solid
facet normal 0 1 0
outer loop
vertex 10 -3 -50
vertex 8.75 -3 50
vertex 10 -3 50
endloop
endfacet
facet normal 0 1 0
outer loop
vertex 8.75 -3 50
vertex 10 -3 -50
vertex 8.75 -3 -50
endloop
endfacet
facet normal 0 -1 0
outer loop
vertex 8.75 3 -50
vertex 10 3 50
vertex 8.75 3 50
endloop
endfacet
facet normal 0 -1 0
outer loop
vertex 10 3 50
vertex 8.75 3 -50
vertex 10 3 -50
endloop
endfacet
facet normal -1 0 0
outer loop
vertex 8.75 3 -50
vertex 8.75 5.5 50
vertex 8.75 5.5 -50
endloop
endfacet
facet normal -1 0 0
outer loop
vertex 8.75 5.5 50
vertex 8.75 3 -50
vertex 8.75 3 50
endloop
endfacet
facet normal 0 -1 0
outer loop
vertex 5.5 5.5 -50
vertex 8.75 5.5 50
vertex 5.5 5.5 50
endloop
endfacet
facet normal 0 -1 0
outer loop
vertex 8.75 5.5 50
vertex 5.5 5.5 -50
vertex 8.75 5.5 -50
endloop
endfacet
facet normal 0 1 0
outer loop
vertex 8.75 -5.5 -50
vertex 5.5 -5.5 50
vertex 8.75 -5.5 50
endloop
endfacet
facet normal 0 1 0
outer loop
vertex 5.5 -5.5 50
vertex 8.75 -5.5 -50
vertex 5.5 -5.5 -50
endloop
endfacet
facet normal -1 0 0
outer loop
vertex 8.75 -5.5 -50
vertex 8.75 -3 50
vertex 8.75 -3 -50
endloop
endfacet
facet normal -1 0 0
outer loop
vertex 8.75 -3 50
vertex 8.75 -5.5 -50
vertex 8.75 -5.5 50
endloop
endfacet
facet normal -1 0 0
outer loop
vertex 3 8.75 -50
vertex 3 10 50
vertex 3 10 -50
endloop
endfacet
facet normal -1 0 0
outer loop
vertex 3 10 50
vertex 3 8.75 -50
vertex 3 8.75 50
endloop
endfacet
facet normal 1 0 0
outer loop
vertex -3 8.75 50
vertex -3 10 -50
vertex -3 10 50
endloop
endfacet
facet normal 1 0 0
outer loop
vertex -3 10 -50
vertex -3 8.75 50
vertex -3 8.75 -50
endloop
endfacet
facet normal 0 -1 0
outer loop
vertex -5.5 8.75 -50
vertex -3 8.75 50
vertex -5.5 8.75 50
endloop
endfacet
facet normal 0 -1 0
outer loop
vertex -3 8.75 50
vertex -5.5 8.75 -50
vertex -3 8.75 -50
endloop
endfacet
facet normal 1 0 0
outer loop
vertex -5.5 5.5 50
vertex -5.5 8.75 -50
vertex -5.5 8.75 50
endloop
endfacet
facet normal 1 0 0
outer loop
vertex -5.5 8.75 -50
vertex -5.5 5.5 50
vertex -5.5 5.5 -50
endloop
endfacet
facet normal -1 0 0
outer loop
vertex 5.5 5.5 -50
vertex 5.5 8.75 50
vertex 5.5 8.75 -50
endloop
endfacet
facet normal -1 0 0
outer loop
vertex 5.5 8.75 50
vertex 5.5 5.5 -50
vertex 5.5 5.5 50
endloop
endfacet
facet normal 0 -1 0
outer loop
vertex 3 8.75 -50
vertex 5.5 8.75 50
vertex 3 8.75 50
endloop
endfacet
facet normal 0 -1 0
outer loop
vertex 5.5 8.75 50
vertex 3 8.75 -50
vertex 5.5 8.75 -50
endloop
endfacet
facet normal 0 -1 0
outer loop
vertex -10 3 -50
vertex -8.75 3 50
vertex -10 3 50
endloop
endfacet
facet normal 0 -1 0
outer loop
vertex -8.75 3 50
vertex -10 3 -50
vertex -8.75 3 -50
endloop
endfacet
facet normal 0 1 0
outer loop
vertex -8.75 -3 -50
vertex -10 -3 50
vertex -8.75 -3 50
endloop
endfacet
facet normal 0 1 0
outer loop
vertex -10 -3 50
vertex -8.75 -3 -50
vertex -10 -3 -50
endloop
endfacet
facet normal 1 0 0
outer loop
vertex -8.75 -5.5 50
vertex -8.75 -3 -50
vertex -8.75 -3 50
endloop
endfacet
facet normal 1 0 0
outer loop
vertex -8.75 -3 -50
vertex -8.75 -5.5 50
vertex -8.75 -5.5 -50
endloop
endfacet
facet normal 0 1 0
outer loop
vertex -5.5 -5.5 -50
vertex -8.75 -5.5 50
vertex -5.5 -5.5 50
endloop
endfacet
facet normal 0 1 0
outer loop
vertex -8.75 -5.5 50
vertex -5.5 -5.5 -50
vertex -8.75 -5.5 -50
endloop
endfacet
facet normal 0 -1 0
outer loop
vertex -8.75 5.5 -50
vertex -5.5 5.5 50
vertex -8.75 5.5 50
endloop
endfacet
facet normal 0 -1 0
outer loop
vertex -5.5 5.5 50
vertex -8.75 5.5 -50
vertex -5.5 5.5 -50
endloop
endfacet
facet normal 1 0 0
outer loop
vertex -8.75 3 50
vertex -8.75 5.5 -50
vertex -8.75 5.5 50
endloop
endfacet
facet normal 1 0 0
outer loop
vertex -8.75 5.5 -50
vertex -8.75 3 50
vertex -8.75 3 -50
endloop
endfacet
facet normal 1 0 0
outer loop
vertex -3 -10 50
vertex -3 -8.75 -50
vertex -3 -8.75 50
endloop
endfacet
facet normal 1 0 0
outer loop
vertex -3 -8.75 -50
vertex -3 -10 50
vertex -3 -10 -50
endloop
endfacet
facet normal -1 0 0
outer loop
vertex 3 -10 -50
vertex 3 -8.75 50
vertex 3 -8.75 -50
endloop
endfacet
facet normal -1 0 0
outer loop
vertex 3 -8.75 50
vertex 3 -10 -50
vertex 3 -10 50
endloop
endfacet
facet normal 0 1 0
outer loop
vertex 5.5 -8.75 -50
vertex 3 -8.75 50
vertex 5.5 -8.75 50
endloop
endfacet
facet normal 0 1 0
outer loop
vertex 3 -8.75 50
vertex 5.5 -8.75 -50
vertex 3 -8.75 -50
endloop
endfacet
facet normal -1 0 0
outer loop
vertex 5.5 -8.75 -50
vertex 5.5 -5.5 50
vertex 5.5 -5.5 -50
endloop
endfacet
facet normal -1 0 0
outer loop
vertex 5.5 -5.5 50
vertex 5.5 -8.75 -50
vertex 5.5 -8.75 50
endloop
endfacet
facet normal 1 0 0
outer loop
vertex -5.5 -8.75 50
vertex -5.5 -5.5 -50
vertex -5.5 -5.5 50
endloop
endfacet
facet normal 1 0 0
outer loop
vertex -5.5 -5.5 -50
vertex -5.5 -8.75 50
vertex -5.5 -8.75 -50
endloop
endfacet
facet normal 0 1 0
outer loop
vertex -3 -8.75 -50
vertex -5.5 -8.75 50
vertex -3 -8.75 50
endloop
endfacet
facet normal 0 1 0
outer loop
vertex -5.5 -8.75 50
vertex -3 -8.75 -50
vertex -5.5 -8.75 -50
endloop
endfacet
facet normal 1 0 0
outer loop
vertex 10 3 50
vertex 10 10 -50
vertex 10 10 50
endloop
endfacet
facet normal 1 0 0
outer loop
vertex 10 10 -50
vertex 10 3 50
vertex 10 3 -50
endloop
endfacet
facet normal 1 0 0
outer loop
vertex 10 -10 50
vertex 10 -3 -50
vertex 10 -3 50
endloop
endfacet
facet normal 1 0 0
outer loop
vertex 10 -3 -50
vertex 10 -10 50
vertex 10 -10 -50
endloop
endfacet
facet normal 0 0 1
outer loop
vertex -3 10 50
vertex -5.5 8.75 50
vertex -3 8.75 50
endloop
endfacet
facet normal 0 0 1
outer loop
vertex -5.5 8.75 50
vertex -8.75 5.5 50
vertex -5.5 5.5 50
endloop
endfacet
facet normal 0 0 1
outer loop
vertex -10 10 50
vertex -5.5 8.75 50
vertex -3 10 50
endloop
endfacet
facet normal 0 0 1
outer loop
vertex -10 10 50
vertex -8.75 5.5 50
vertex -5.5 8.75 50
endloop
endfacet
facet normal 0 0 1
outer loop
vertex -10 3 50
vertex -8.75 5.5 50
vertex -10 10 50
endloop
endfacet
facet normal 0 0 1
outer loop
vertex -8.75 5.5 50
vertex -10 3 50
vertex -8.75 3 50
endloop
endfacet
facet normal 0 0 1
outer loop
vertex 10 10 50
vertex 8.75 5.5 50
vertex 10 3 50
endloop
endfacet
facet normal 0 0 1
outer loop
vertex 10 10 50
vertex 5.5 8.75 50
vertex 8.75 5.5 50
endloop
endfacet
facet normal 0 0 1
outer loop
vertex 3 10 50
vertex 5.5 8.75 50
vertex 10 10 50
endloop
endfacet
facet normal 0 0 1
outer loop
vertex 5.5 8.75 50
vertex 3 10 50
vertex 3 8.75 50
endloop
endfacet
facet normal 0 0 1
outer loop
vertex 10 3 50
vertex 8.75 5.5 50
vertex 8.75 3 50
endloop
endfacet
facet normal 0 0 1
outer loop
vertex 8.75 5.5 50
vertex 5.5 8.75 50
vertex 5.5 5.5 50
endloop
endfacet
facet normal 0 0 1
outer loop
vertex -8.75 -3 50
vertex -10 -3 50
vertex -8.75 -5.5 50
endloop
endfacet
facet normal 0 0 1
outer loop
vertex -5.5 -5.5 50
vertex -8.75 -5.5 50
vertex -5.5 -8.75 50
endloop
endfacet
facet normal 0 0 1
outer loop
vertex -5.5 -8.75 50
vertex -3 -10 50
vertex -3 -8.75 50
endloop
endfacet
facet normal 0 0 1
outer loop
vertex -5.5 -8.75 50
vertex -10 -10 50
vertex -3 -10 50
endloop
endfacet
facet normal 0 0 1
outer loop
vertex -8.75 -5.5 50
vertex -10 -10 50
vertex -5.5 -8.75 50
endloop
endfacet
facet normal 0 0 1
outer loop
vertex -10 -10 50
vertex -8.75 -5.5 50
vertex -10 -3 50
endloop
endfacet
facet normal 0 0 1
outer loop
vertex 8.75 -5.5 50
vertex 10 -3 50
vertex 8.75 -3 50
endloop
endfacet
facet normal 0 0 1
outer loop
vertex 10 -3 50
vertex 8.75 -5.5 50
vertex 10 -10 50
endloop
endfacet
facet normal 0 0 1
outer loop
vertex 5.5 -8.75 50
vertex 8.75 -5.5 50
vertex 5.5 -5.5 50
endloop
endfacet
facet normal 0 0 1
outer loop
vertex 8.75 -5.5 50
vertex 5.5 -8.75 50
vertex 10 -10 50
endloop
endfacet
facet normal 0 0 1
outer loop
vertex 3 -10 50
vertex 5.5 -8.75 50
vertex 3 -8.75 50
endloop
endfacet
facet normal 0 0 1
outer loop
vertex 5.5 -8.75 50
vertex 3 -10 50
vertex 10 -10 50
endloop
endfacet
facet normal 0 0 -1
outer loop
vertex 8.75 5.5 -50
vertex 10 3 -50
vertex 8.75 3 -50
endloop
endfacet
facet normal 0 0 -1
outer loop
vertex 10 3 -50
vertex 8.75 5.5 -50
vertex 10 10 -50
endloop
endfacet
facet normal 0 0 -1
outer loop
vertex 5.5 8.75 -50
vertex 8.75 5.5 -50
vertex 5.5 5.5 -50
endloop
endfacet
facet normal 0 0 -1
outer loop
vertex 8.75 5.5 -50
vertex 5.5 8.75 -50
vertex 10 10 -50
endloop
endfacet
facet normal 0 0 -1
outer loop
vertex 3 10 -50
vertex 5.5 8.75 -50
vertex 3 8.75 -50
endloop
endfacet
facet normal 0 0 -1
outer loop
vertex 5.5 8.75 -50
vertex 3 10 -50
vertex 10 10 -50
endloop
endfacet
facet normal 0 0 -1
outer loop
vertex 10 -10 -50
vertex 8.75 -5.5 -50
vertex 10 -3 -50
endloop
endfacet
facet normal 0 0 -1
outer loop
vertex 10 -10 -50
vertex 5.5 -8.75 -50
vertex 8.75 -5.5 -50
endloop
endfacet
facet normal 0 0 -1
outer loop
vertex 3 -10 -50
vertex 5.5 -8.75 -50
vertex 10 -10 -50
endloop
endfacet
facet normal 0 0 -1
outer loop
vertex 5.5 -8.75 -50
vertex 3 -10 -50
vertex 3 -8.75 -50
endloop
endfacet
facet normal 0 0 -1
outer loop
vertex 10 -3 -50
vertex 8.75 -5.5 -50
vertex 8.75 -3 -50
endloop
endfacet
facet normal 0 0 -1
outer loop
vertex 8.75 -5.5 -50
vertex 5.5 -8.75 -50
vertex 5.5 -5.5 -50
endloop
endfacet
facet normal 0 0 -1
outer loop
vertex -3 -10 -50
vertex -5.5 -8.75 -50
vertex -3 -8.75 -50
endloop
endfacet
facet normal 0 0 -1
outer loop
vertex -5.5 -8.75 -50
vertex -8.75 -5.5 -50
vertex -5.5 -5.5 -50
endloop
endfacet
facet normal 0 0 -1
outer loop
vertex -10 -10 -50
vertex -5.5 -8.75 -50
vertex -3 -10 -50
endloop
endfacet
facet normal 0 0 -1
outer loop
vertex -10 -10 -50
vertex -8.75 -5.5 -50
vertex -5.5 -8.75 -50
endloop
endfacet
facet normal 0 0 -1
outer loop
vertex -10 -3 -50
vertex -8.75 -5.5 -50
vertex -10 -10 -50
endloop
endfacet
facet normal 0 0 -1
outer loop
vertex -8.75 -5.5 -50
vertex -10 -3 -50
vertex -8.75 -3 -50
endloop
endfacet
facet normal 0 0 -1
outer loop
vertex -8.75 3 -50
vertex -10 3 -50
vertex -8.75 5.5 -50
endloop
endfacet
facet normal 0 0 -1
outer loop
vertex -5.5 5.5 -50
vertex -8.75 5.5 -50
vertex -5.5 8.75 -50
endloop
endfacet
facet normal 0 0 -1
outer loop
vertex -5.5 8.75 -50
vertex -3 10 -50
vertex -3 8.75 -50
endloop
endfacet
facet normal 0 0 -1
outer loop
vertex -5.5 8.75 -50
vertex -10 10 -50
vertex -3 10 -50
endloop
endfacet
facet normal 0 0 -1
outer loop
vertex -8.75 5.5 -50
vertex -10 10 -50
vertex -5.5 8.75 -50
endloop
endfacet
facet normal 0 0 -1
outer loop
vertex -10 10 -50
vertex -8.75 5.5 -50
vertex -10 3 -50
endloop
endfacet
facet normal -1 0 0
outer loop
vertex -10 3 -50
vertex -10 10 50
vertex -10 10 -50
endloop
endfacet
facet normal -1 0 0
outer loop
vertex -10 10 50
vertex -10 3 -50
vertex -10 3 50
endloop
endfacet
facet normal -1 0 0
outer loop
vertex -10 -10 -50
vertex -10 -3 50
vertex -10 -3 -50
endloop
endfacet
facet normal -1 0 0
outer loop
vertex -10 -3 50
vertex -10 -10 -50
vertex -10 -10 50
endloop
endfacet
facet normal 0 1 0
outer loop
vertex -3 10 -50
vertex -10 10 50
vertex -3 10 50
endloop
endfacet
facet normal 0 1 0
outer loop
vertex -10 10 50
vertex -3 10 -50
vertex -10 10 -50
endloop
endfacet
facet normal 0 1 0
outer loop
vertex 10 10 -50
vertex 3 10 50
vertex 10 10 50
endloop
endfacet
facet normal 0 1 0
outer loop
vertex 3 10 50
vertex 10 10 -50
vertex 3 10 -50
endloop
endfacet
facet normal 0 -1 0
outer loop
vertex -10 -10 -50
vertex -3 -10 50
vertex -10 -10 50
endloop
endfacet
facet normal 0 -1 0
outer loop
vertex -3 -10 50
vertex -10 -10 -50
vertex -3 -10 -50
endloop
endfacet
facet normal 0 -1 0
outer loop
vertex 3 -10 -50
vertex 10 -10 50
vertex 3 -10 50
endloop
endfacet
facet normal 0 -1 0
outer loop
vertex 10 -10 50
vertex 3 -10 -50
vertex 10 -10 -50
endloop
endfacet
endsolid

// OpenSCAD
// 20x20 T-slot aluminium extrusion (2020-style), 100mm long
// STRUCTURAL FIX: prevent the slot cutters from removing the central webs,
// which previously split the body into disconnected corner blocks / two rails.
// Approach: keep a guaranteed "web" thickness at the center in BOTH axes by
// limiting the slot cavity/mouth width to (outer - 2*min_wall - 2*web_keep).

cross_section_width_mm  = 20.0;
cross_section_height_mm = 20.0;
length_mm               = 100.0;

// Robust overlap for manifold boolean ops
overlap_mm = 1.5;

// Outer size
outer_w = cross_section_width_mm;
outer_h = cross_section_height_mm;

// Typical-ish 2020 features (approximate)
center_bore_diameter_mm = 5.0;

// T-slot geometry (per side, cut from the outer face inward)
slot_opening_mm       = 6.0;
slot_opening_depth_mm = 2.0;
slot_cavity_width_mm  = 11.0;
slot_cavity_depth_mm  = 6.5;

// Minimum wall to outer boundary
min_wall_mm = 1.6;

// CRITICAL CONNECTIVITY PARAMETER:
// Keep a solid web through the center so the profile cannot split into two rails / four corners.
web_keep_mm = 2.0;  // >= 1..2mm as requested

// Helpers
function clamp(v, lo, hi) = max(lo, min(hi, v));

// Clamp depths to safe ranges
slot_opening_depth_mm_c = clamp(slot_opening_depth_mm, 0.8, outer_w/2.0 - min_wall_mm);
slot_cavity_depth_mm_c  = clamp(slot_cavity_depth_mm, slot_opening_depth_mm_c + 1.0, outer_w/2.0 - min_wall_mm);

// Clamp widths to safe ranges (will be further limited for connectivity)
slot_opening_mm_c      = clamp(slot_opening_mm, 2.0, outer_h - 2.0*min_wall_mm);
slot_cavity_width_mm_c = clamp(slot_cavity_width_mm, slot_opening_mm_c, outer_h - 2.0*min_wall_mm);

// 2D cutter for one side, pointing toward +X, centered at origin
module tslot_cut_2d() {
    // Ensure the cutter NEVER removes the central web:
    // Remaining material at center in Y must be at least web_keep_mm.
    // So cutter width must be <= (outer_h - 2*min_wall_mm - 2*web_keep_mm).
    safe_max_w = max(0.1, outer_h - 2*min_wall_mm - 2*web_keep_mm);

    safe_cavity_w = min(slot_cavity_width_mm_c, safe_max_w);
    safe_mouth_w  = min(slot_opening_mm_c, safe_max_w);

    union() {
        // Narrow mouth (outer face inward)
        translate([outer_w/2.0 - slot_opening_depth_mm_c/2.0, 0])
            square([slot_opening_depth_mm_c + overlap_mm, safe_mouth_w], center=true);

        // Wider cavity behind the mouth
        translate([outer_w/2.0 - slot_opening_depth_mm_c - slot_cavity_depth_mm_c/2.0, 0])
            square([slot_cavity_depth_mm_c + overlap_mm, safe_cavity_w], center=true);
    }
}

module extrusion_2020(len=length_mm) {
    // Single connected solid: base minus cutters
    union() {
        difference() {
            // Main continuous outer square body
            cube([outer_w, outer_h, len], center=true);

            // Center bore (through)
            cylinder(d=center_bore_diameter_mm, h=len + 2*overlap_mm, center=true, $fn=64);

            // Four T-slots (cut through full length)
            for (a = [0, 90, 180, 270]) {
                rotate([0, 0, a])
                    linear_extrude(height=len + 2*overlap_mm, center=true, convexity=10)
                        tslot_cut_2d();
            }
        }
    }
}

// Render
extrusion_2020(length_mm);
